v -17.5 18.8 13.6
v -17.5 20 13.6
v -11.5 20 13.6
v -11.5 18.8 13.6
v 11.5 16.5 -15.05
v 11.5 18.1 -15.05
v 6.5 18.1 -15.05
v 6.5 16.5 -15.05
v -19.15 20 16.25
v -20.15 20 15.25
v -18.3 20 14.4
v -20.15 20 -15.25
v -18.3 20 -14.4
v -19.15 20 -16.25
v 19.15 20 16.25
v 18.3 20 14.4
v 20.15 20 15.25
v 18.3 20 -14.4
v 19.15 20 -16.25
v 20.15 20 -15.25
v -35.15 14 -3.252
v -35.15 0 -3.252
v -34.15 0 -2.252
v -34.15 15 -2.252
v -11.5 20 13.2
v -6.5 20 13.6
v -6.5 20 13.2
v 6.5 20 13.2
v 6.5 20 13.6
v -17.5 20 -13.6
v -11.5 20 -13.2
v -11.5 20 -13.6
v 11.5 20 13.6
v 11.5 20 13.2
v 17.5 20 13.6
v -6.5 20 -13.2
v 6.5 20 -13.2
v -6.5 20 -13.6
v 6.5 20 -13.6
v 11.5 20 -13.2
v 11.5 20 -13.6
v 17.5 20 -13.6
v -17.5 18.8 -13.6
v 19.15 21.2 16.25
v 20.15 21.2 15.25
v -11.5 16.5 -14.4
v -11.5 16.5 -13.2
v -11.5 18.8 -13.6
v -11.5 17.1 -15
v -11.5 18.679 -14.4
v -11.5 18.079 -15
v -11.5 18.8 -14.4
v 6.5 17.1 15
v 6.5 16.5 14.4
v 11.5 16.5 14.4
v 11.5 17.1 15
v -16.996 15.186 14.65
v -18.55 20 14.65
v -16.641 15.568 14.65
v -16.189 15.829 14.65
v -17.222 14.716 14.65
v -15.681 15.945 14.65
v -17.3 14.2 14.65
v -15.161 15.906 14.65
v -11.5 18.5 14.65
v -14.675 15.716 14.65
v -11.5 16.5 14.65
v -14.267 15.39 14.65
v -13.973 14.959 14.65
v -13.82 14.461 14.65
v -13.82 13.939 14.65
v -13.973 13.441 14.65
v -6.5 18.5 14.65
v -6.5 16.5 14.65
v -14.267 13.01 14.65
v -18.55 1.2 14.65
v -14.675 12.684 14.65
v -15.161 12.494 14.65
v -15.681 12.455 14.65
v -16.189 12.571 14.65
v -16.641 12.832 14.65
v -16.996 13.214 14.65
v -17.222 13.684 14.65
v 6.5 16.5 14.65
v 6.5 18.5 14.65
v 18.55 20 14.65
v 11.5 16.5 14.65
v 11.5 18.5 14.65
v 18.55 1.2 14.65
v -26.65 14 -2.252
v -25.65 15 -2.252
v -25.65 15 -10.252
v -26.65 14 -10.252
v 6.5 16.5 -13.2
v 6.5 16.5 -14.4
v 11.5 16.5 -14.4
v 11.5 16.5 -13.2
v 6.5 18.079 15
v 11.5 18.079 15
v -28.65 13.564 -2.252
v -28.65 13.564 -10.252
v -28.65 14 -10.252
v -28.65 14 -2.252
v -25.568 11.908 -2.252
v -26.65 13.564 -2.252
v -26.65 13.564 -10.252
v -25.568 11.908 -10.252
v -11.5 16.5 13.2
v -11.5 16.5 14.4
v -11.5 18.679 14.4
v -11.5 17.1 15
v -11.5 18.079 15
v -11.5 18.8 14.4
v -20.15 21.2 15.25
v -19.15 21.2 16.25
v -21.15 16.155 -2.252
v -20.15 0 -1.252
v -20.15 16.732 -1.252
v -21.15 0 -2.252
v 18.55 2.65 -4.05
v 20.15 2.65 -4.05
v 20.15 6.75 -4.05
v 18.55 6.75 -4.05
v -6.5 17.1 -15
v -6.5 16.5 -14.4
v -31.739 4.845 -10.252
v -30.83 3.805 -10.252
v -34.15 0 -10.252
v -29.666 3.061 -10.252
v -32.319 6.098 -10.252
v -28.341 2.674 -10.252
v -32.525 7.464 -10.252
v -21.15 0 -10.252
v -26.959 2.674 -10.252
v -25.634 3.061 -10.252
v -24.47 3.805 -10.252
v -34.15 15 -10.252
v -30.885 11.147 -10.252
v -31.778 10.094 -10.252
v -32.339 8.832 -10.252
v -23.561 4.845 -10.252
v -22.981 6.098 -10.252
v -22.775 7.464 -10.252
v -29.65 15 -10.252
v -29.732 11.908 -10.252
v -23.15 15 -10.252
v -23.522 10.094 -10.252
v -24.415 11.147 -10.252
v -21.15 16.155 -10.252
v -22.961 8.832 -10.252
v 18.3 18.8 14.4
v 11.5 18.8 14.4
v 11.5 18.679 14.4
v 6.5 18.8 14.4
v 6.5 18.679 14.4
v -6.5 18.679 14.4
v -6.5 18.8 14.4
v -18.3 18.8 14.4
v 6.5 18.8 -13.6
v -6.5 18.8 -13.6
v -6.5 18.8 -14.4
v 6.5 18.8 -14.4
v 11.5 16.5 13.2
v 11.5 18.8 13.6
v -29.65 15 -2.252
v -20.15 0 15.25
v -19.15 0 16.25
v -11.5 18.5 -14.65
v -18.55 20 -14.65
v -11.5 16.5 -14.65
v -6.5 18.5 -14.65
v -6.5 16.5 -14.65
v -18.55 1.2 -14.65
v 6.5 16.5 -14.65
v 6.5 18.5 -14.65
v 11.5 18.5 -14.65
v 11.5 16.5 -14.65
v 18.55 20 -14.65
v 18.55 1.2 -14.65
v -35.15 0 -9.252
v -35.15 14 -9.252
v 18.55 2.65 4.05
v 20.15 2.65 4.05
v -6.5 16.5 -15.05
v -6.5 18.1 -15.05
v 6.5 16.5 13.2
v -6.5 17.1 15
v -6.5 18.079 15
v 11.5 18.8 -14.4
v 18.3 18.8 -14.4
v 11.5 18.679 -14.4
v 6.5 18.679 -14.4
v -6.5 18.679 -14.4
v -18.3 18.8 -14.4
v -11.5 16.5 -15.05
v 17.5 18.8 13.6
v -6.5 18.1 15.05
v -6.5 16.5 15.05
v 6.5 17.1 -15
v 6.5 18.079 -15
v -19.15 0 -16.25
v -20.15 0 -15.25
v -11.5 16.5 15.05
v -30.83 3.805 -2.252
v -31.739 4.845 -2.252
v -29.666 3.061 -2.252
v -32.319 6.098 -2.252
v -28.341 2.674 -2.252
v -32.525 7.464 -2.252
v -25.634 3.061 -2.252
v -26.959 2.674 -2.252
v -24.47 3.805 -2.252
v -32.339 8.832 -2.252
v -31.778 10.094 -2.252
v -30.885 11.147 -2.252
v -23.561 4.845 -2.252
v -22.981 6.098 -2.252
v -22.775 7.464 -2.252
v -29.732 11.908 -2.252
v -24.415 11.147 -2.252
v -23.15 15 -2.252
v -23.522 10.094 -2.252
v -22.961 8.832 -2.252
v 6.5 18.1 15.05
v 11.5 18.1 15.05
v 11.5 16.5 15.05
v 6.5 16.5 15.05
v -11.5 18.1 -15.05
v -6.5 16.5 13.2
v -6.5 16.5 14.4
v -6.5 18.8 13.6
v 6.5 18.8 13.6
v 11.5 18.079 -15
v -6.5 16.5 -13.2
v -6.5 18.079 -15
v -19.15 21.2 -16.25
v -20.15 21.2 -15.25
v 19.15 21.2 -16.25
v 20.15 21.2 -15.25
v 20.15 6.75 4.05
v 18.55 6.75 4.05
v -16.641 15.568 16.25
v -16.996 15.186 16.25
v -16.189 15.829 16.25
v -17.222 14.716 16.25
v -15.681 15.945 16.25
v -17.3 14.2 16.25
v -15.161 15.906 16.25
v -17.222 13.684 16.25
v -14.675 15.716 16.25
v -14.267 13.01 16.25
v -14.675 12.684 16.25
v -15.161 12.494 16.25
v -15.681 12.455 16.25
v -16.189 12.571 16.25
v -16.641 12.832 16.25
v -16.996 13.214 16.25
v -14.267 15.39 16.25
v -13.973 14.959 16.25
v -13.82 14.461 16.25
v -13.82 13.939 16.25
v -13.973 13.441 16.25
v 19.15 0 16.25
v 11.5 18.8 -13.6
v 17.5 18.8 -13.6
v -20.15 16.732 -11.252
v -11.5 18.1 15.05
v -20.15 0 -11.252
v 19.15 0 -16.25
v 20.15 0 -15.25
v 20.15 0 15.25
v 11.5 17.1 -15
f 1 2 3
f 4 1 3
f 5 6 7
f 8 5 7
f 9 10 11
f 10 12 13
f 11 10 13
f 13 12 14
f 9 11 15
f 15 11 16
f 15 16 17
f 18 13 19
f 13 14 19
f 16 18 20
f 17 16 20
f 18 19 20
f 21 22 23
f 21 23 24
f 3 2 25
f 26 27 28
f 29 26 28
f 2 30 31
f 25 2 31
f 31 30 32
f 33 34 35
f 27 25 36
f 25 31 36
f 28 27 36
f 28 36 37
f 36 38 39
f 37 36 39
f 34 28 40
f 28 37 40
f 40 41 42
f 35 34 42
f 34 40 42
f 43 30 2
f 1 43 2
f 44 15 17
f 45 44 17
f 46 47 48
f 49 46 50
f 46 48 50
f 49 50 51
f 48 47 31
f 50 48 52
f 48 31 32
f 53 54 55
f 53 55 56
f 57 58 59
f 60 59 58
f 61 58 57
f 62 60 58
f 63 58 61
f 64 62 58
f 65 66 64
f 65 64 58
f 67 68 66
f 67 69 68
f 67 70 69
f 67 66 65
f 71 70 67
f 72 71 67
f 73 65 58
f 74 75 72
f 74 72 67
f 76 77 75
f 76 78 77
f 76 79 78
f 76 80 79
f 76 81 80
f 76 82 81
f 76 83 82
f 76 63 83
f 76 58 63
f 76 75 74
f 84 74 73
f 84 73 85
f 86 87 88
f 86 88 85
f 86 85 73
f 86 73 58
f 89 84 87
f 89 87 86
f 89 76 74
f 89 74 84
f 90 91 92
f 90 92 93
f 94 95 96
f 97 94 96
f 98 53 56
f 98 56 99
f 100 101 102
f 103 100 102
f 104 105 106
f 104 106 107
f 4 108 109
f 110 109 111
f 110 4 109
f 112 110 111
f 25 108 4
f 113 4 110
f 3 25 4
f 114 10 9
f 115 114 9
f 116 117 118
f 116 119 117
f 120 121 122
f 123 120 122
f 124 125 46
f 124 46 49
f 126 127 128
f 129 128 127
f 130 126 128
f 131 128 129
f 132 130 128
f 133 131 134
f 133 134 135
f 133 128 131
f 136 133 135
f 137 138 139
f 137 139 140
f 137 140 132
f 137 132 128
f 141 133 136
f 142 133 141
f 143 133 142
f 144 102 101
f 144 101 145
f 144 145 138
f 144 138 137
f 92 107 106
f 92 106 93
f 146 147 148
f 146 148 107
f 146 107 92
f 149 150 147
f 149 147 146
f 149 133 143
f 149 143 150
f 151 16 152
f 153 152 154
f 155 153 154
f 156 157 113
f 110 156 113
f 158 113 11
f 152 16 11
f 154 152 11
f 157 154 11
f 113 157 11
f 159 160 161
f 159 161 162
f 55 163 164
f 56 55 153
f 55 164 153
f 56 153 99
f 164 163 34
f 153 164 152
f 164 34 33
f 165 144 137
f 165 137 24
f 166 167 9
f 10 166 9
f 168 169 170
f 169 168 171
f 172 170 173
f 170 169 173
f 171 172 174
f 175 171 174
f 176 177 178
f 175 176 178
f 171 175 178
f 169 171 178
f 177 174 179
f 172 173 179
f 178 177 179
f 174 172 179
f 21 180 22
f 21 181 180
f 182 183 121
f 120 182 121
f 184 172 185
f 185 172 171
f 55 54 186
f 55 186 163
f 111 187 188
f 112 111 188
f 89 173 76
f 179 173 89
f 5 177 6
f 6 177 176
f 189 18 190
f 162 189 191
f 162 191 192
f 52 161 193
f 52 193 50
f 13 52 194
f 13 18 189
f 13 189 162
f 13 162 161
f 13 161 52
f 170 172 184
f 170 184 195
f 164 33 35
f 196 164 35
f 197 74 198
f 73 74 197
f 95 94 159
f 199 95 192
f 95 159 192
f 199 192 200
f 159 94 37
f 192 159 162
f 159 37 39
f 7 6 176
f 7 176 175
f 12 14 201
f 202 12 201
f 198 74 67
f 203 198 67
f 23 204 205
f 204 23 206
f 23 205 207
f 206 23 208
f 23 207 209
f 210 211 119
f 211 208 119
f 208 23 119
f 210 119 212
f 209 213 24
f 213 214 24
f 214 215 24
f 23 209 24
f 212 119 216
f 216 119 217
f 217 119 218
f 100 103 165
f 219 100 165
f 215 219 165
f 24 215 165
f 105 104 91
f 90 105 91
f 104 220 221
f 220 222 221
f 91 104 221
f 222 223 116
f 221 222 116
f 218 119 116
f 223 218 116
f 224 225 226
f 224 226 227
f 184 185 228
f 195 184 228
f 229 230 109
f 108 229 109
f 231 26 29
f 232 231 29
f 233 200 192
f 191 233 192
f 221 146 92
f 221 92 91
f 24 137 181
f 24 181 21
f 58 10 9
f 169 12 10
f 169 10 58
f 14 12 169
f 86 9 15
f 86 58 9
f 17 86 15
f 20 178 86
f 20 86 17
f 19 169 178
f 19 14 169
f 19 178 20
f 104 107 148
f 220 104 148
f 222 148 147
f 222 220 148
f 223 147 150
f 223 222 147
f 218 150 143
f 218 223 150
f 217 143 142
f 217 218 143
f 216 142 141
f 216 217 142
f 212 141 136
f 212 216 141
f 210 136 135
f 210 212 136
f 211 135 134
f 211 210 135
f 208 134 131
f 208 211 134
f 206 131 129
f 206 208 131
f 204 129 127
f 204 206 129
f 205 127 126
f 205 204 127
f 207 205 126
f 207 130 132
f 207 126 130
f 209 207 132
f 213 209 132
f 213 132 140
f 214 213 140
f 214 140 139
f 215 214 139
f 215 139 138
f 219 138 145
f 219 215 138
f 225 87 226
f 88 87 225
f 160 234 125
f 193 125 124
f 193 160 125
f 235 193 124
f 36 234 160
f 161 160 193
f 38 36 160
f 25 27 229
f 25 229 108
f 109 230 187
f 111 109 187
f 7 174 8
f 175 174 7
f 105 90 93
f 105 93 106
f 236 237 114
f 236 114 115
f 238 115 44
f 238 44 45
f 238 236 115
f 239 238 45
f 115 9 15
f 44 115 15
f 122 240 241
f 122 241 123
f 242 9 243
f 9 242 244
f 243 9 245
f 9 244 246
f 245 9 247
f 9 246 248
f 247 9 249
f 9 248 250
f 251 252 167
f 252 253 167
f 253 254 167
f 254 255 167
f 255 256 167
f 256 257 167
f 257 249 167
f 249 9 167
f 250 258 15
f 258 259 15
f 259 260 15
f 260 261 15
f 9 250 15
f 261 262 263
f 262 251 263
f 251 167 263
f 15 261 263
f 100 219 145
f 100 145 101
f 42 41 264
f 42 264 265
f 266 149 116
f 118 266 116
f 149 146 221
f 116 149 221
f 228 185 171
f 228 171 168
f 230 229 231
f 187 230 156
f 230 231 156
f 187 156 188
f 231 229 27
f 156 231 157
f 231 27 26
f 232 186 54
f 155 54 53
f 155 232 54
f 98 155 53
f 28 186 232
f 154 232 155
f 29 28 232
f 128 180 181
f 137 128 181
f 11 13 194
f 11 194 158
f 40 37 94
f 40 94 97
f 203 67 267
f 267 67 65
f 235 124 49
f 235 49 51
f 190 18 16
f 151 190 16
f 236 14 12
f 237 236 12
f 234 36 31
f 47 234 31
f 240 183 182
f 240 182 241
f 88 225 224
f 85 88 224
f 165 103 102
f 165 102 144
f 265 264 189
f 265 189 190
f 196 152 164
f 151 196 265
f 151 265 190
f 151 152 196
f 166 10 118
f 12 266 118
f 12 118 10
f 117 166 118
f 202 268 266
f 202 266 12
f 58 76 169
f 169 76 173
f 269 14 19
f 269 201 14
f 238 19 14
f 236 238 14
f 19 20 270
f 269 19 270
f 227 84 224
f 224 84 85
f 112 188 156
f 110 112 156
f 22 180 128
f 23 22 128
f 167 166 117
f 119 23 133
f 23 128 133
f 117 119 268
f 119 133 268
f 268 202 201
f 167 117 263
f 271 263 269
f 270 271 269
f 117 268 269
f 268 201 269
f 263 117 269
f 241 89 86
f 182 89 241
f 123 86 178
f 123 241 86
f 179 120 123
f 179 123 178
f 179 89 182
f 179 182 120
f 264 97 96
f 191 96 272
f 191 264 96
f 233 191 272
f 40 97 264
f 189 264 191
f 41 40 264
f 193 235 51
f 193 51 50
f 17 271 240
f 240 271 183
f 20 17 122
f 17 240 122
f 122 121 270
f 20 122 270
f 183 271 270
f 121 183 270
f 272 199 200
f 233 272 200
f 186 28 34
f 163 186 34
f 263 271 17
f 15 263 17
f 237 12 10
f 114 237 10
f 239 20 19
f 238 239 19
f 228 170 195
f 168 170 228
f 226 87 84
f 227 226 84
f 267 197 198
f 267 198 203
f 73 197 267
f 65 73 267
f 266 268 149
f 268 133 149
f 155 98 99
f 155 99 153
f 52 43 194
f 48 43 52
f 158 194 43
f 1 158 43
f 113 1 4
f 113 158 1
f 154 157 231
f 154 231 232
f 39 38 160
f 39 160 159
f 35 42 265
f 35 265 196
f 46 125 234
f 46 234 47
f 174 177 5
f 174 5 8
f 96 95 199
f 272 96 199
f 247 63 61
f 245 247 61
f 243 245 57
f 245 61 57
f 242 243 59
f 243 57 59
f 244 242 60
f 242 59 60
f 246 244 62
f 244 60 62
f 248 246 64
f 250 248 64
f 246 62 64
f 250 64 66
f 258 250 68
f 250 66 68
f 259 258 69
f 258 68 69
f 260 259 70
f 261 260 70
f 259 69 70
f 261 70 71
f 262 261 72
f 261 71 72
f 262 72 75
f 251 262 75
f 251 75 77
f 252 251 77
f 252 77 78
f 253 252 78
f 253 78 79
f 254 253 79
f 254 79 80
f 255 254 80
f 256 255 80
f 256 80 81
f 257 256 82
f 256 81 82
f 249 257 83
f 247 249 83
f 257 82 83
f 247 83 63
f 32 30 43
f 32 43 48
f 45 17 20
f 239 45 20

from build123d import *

# Parameters (mm, degrees)
SKETCH2_W                = 40.3
SKETCH2_H                = 32.5
BOSS_EXTRUDE1_DEPTH      = 1.2
SKETCH2_3_W              = 40.3
SKETCH2_3_H              = 32.5
SKETCH2_3_W_2            = 37.1
SKETCH2_3_H_2            = 29.3
BOSS_EXTRUDE2_DEPTH      = 20
CUT_EXTRUDE1_REACH       = 49.835
SKETCH3_W                = 8.1
SKETCH3_H                = 4.1
CHAMFER1_SIZE            = 1
SKETCH4_W                = 8
SKETCH4_H                = 15
BOSS_EXTRUDE3_DEPTH      = 15
CUT_EXTRUDE3_REACH       = 46.473
CHAMFER2_SIZE            = 1.292646163
CHAMFER2_SIZE_2          = 1
CHAMFER3_SIZE            = 1
SKETCH6_W                = 5
SKETCH6_H                = 2
CUT_EXTRUDE4_DEPTH       = 0.4
CHAMFER4_SIZE            = 0.4
CHAMFER4_OF_MIRROR1_SIZE = 0.4
BOSS_EXTRUDE4_DEPTH      = 1.2
SKETCH8_W                = 36.6
SKETCH8_H                = 28.8
SKETCH8_W_2              = 35
SKETCH8_H_2              = 27.2
BOSS_EXTRUDE5_DEPTH      = 1.2
SKETCH10_W               = 5
SKETCH10_H               = 1.2
BOSS_EXTRUDE6_DEPTH      = 3.5
BOSS_EXTRUDE7_DEPTH      = 5
MIRROR7_COPY_1_SKETCH_W  = 5
MIRROR7_COPY_1_SKETCH_H  = 1.2
MIRROR7_COPY_1_DEPTH     = 3.5
MIRROR7_COPY_2_DEPTH     = 5
SKETCH15_R               = 1.75
CUT_EXTRUDE6_DEPTH       = 1.6
CHAMFER6_SIZE2           = 3
CHAMFER6_SIZE            = 1.732050808


# Some blends are built 0.0001 mm under size
with BuildPart() as part:
    # Sketch2 → Boss-Extrude1 (new body)
    with BuildSketch(Plane(origin=(0, 0, 0), x_dir=(1, 0, 0), z_dir=(0, 1, 0))):
        Rectangle(SKETCH2_W, SKETCH2_H)
    extrude(amount=BOSS_EXTRUDE1_DEPTH)

    # Sketch2<3> → Boss-Extrude2 (add)
    with BuildSketch(Plane(origin=(0, 0, 0), x_dir=(1, 0, 0), z_dir=(0, 1, 0))):
        Rectangle(SKETCH2_3_W, SKETCH2_3_H)
        Rectangle(SKETCH2_3_W_2, SKETCH2_3_H_2, mode=Mode.SUBTRACT)
    extrude(amount=BOSS_EXTRUDE2_DEPTH)

    # Sketch3 → Cut-Extrude1 (cut, up to next)
    with BuildSketch(Plane(origin=(20.15, 0, 0), x_dir=(0, 0, -1), z_dir=(1, 0, 0)), mode=Mode.PRIVATE) as cut_extrude1_sk1:
        with Locations((0, 4.7)):
            Rectangle(SKETCH3_W, SKETCH3_H)
    cut_extrude1_tool1 = extrude(cut_extrude1_sk1.sketch, amount=-CUT_EXTRUDE1_REACH, mode=Mode.PRIVATE) & part.part
    add(cut_extrude1_tool1.solids().sort_by_distance((20.15, 4.7, 0))[0], mode=Mode.SUBTRACT)

    # Chamfer1
    chamfer1_edges = [part.edges().sort_by_distance(p)[0] for p in [
        (-20.15, 10, -16.25),
        (20.15, 10, -16.25),
        (20.15, 10, 16.25),
        (-20.15, 10, 16.25),
    ]]
    chamfer(chamfer1_edges, length=CHAMFER1_SIZE)

    # Sketch4 → Boss-Extrude3 (add)
    with BuildSketch(Plane.ZY.offset(20.15)):
        with Locations((-6.25220384, 7.5)):
            Rectangle(SKETCH4_W, SKETCH4_H)
    extrude(amount=BOSS_EXTRUDE3_DEPTH)

    # Sketch5 → Cut-Extrude3 (cut, up to next)
    with BuildSketch(Plane.XY.offset(-2.25220384), mode=Mode.PRIVATE) as cut_extrude3_sk1:
        with BuildLine():
            Line((-28.65, 12.271333671), (-28.65, 15))
            Line((-28.65, 15), (-26.65, 15))
            Line((-26.65, 15), (-26.65, 12.271333671))
            ThreePointArc((-26.65, 12.271333671), (-27.65, 2.625), (-28.65, 12.271333671))
        make_face()
    cut_extrude3_tool1 = extrude(cut_extrude3_sk1.sketch, amount=-CUT_EXTRUDE3_REACH, mode=Mode.PRIVATE) & part.part
    add(cut_extrude3_tool1.solids().sort_by_distance((-27.65, 7.91032, -2.252204))[0], mode=Mode.SUBTRACT)

    # Chamfer2
    # the kernel refuses this chamfer: 1.292646163, 1 mm, written as the material it takes off along each edge
    with BuildSketch(Plane(origin=(-28.65, 12.271333671, 1.088369735), x_dir=(-0.9479887076176806, -0.3183039588653585, 0), z_dir=(0, 0, -1))) as chamfer2_piece_1:
        with BuildLine():
            Line((1.141491378, 0), (-CHAMFER2_SIZE * 0.318303958917, CHAMFER2_SIZE * 0.947988707772))
            Line((-CHAMFER2_SIZE * 0.318303958917, CHAMFER2_SIZE * 0.947988707772), (0, 0))
            ThreePointArc((0, 0), (0.591249169, 0.033482483), (1.141491378, 0))
        make_face()
    extrude(amount=14.68114715, mode=Mode.SUBTRACT)
    with BuildSketch(Plane(origin=(-28.65, 15, 0.319479148), x_dir=(0, -1, 0), z_dir=(0, 0, -1)), Plane(origin=(-26.65, 15, 0.319479148), x_dir=(1, 0, 0), z_dir=(0, 0, -1))) as chamfer2_piece_2:
        Polygon((CHAMFER2_SIZE_2, 0), (0, CHAMFER2_SIZE_2), (0, 0), align=None)
    extrude(amount=13.143365976, mode=Mode.SUBTRACT)
    with BuildSketch(Plane(origin=(-26.65, 12.271333671, 1.088369735), x_dir=(0, 1, 0), z_dir=(0, 0, -1))) as chamfer2_piece_3:
        with BuildLine():
            Line((CHAMFER2_SIZE, 0), (-0.363341225, 1.082120936))
            ThreePointArc((-0.363341225, 1.082120936), (-0.156455935, 0.571155143), (0, 0))
            Line((0, 0), (CHAMFER2_SIZE, 0))
        make_face()
    extrude(amount=14.68114715, mode=Mode.SUBTRACT)

    # Chamfer3
    chamfer3_edges = [part.edges().sort_by_distance(p)[0] for p in [
        (-20.15, 7.5, -10.25220384),
        (-20.15, 7.5, -2.25220384),
        (-35.15, 7.5, -10.25220384),
        (-35.15, 7.5, -2.25220384),
        (-35.15, 15, -6.25220384),
    ]]
    chamfer(chamfer3_edges, length=CHAMFER3_SIZE)

    # Sketch6 → Cut-Extrude4 (cut)
    with BuildSketch(Plane(origin=(0, 0, 14.65), x_dir=(-1, 0, 0), z_dir=(0, 0, -1))):
        with Locations((-9, 17.5)):
            Rectangle(SKETCH6_W, SKETCH6_H)
        with Locations((9, 17.5)):
            Rectangle(SKETCH6_W, SKETCH6_H)
    cut_extrude4 = extrude(amount=-CUT_EXTRUDE4_DEPTH, mode=Mode.SUBTRACT)

    # Chamfer4
    chamfer4_edges = [part.edges().sort_by_distance(p)[0] for p in [
        (9, 18.5, 15.05),
        (-9, 18.5, 15.05),
    ]]
    chamfer(chamfer4_edges, length=CHAMFER4_SIZE - 0.0001)  # a hair under: the kernel refuses the full size

    # Mirror1: Cut-Extrude4 across plane
    add(cut_extrude4.mirror(Plane.XY), mode=Mode.SUBTRACT)

    # Chamfer4 of Mirror1
    chamfer4_of_mirror1_edges = [part.edges().sort_by_distance(p)[0] for p in [
        (9, 18.5, -15.05),
        (-9, 18.5, -15.05),
    ]]
    chamfer(chamfer4_of_mirror1_edges, length=CHAMFER4_OF_MIRROR1_SIZE - 0.0001)  # a hair under: the kernel refuses the full size

    # Sketch15 → Cut-Extrude6 (cut)
    with BuildSketch(Plane(origin=(0, 0, 14.65), x_dir=(-1, 0, 0), z_dir=(0, 0, -1))):
        with Locations((15.55, 14.2)):
            Circle(SKETCH15_R)
    extrude(amount=-CUT_EXTRUDE6_DEPTH, mode=Mode.SUBTRACT)

    # Chamfer6
    chamfer6_edges = [part.edges().sort_by_distance(p)[0] for p in [
        (-20.15, 15, -6.25220384),
    ]]
    chamfer6_side = [part.faces().sort_by_distance(p)[0] for p in [
        (-20.15, 15.034641016, -6.25220384),
    ]]
    chamfer(chamfer6_edges, length=CHAMFER6_SIZE - 0.0001, length2=CHAMFER6_SIZE2 - 0.0001, reference=chamfer6_side[0])  # a hair under: the kernel refuses the full size


with BuildPart() as body_2:
    # Sketch7 → Boss-Extrude4 (new body)
    with BuildSketch(Plane(origin=(0, 20, 0), x_dir=(1, 0, 0), z_dir=(0, 1, 0))):
        Polygon((-19.15, 16.25), (-20.15, 15.25), (-20.15, -15.25), (-19.15, -16.25), (19.15, -16.25), (20.15, -15.25), (20.15, 15.25), (19.15, 16.25), align=None)
    extrude(amount=BOSS_EXTRUDE4_DEPTH)

    # Sketch8 → Boss-Extrude5 (add)
    with BuildSketch(Plane.XZ.offset(-20)):
        Rectangle(SKETCH8_W, SKETCH8_H)
        Rectangle(SKETCH8_W_2, SKETCH8_H_2, mode=Mode.SUBTRACT)
    extrude(amount=BOSS_EXTRUDE5_DEPTH)

    # Sketch10 → Boss-Extrude6 (add)
    with BuildSketch(Plane.XZ.offset(-20)):
        with Locations((9, 13.8)):
            Rectangle(SKETCH10_W, SKETCH10_H)
    boss_extrude6 = extrude(amount=BOSS_EXTRUDE6_DEPTH)

    # Sketch13 → Boss-Extrude7 (add)
    with BuildSketch(Plane.ZY.offset(-6.5)):
        Polygon((15, 18.079289322), (14.4, 18.679289322), (14.4, 16.5), (15, 17.1), align=None)
    boss_extrude7 = extrude(amount=-BOSS_EXTRUDE7_DEPTH)

    # Mirror6: Boss-Extrude6, Boss-Extrude7 across plane
    add(boss_extrude6.mirror(Plane.ZY))
    add(boss_extrude7.mirror(Plane.ZY))

    # Mirror7: Boss-Extrude6, Boss-Extrude7 across plane
    add(boss_extrude6.mirror(Plane.XY))
    add(boss_extrude7.mirror(Plane.XY))

    # Mirror7 copy 1 sketch → Mirror7 copy 1 (add)
    with BuildSketch(Plane(origin=(0, 20, 0), x_dir=(-1, 0, 0), z_dir=(0, -1, 0))):
        with Locations((9, 13.8)):
            Rectangle(MIRROR7_COPY_1_SKETCH_W, MIRROR7_COPY_1_SKETCH_H)
    extrude(amount=MIRROR7_COPY_1_DEPTH)

    # Mirror7 copy 2 sketch → Mirror7 copy 2 (add)
    with BuildSketch(Plane(origin=(-6.5, 0, 0), x_dir=(0, 0, -1), z_dir=(1, 0, 0))):
        Polygon((15, 18.079289322), (14.4, 18.679289322), (14.4, 16.5), (15, 17.1), align=None)
    extrude(amount=-MIRROR7_COPY_2_DEPTH)


solid = Compound([part.part, body_2.part])
